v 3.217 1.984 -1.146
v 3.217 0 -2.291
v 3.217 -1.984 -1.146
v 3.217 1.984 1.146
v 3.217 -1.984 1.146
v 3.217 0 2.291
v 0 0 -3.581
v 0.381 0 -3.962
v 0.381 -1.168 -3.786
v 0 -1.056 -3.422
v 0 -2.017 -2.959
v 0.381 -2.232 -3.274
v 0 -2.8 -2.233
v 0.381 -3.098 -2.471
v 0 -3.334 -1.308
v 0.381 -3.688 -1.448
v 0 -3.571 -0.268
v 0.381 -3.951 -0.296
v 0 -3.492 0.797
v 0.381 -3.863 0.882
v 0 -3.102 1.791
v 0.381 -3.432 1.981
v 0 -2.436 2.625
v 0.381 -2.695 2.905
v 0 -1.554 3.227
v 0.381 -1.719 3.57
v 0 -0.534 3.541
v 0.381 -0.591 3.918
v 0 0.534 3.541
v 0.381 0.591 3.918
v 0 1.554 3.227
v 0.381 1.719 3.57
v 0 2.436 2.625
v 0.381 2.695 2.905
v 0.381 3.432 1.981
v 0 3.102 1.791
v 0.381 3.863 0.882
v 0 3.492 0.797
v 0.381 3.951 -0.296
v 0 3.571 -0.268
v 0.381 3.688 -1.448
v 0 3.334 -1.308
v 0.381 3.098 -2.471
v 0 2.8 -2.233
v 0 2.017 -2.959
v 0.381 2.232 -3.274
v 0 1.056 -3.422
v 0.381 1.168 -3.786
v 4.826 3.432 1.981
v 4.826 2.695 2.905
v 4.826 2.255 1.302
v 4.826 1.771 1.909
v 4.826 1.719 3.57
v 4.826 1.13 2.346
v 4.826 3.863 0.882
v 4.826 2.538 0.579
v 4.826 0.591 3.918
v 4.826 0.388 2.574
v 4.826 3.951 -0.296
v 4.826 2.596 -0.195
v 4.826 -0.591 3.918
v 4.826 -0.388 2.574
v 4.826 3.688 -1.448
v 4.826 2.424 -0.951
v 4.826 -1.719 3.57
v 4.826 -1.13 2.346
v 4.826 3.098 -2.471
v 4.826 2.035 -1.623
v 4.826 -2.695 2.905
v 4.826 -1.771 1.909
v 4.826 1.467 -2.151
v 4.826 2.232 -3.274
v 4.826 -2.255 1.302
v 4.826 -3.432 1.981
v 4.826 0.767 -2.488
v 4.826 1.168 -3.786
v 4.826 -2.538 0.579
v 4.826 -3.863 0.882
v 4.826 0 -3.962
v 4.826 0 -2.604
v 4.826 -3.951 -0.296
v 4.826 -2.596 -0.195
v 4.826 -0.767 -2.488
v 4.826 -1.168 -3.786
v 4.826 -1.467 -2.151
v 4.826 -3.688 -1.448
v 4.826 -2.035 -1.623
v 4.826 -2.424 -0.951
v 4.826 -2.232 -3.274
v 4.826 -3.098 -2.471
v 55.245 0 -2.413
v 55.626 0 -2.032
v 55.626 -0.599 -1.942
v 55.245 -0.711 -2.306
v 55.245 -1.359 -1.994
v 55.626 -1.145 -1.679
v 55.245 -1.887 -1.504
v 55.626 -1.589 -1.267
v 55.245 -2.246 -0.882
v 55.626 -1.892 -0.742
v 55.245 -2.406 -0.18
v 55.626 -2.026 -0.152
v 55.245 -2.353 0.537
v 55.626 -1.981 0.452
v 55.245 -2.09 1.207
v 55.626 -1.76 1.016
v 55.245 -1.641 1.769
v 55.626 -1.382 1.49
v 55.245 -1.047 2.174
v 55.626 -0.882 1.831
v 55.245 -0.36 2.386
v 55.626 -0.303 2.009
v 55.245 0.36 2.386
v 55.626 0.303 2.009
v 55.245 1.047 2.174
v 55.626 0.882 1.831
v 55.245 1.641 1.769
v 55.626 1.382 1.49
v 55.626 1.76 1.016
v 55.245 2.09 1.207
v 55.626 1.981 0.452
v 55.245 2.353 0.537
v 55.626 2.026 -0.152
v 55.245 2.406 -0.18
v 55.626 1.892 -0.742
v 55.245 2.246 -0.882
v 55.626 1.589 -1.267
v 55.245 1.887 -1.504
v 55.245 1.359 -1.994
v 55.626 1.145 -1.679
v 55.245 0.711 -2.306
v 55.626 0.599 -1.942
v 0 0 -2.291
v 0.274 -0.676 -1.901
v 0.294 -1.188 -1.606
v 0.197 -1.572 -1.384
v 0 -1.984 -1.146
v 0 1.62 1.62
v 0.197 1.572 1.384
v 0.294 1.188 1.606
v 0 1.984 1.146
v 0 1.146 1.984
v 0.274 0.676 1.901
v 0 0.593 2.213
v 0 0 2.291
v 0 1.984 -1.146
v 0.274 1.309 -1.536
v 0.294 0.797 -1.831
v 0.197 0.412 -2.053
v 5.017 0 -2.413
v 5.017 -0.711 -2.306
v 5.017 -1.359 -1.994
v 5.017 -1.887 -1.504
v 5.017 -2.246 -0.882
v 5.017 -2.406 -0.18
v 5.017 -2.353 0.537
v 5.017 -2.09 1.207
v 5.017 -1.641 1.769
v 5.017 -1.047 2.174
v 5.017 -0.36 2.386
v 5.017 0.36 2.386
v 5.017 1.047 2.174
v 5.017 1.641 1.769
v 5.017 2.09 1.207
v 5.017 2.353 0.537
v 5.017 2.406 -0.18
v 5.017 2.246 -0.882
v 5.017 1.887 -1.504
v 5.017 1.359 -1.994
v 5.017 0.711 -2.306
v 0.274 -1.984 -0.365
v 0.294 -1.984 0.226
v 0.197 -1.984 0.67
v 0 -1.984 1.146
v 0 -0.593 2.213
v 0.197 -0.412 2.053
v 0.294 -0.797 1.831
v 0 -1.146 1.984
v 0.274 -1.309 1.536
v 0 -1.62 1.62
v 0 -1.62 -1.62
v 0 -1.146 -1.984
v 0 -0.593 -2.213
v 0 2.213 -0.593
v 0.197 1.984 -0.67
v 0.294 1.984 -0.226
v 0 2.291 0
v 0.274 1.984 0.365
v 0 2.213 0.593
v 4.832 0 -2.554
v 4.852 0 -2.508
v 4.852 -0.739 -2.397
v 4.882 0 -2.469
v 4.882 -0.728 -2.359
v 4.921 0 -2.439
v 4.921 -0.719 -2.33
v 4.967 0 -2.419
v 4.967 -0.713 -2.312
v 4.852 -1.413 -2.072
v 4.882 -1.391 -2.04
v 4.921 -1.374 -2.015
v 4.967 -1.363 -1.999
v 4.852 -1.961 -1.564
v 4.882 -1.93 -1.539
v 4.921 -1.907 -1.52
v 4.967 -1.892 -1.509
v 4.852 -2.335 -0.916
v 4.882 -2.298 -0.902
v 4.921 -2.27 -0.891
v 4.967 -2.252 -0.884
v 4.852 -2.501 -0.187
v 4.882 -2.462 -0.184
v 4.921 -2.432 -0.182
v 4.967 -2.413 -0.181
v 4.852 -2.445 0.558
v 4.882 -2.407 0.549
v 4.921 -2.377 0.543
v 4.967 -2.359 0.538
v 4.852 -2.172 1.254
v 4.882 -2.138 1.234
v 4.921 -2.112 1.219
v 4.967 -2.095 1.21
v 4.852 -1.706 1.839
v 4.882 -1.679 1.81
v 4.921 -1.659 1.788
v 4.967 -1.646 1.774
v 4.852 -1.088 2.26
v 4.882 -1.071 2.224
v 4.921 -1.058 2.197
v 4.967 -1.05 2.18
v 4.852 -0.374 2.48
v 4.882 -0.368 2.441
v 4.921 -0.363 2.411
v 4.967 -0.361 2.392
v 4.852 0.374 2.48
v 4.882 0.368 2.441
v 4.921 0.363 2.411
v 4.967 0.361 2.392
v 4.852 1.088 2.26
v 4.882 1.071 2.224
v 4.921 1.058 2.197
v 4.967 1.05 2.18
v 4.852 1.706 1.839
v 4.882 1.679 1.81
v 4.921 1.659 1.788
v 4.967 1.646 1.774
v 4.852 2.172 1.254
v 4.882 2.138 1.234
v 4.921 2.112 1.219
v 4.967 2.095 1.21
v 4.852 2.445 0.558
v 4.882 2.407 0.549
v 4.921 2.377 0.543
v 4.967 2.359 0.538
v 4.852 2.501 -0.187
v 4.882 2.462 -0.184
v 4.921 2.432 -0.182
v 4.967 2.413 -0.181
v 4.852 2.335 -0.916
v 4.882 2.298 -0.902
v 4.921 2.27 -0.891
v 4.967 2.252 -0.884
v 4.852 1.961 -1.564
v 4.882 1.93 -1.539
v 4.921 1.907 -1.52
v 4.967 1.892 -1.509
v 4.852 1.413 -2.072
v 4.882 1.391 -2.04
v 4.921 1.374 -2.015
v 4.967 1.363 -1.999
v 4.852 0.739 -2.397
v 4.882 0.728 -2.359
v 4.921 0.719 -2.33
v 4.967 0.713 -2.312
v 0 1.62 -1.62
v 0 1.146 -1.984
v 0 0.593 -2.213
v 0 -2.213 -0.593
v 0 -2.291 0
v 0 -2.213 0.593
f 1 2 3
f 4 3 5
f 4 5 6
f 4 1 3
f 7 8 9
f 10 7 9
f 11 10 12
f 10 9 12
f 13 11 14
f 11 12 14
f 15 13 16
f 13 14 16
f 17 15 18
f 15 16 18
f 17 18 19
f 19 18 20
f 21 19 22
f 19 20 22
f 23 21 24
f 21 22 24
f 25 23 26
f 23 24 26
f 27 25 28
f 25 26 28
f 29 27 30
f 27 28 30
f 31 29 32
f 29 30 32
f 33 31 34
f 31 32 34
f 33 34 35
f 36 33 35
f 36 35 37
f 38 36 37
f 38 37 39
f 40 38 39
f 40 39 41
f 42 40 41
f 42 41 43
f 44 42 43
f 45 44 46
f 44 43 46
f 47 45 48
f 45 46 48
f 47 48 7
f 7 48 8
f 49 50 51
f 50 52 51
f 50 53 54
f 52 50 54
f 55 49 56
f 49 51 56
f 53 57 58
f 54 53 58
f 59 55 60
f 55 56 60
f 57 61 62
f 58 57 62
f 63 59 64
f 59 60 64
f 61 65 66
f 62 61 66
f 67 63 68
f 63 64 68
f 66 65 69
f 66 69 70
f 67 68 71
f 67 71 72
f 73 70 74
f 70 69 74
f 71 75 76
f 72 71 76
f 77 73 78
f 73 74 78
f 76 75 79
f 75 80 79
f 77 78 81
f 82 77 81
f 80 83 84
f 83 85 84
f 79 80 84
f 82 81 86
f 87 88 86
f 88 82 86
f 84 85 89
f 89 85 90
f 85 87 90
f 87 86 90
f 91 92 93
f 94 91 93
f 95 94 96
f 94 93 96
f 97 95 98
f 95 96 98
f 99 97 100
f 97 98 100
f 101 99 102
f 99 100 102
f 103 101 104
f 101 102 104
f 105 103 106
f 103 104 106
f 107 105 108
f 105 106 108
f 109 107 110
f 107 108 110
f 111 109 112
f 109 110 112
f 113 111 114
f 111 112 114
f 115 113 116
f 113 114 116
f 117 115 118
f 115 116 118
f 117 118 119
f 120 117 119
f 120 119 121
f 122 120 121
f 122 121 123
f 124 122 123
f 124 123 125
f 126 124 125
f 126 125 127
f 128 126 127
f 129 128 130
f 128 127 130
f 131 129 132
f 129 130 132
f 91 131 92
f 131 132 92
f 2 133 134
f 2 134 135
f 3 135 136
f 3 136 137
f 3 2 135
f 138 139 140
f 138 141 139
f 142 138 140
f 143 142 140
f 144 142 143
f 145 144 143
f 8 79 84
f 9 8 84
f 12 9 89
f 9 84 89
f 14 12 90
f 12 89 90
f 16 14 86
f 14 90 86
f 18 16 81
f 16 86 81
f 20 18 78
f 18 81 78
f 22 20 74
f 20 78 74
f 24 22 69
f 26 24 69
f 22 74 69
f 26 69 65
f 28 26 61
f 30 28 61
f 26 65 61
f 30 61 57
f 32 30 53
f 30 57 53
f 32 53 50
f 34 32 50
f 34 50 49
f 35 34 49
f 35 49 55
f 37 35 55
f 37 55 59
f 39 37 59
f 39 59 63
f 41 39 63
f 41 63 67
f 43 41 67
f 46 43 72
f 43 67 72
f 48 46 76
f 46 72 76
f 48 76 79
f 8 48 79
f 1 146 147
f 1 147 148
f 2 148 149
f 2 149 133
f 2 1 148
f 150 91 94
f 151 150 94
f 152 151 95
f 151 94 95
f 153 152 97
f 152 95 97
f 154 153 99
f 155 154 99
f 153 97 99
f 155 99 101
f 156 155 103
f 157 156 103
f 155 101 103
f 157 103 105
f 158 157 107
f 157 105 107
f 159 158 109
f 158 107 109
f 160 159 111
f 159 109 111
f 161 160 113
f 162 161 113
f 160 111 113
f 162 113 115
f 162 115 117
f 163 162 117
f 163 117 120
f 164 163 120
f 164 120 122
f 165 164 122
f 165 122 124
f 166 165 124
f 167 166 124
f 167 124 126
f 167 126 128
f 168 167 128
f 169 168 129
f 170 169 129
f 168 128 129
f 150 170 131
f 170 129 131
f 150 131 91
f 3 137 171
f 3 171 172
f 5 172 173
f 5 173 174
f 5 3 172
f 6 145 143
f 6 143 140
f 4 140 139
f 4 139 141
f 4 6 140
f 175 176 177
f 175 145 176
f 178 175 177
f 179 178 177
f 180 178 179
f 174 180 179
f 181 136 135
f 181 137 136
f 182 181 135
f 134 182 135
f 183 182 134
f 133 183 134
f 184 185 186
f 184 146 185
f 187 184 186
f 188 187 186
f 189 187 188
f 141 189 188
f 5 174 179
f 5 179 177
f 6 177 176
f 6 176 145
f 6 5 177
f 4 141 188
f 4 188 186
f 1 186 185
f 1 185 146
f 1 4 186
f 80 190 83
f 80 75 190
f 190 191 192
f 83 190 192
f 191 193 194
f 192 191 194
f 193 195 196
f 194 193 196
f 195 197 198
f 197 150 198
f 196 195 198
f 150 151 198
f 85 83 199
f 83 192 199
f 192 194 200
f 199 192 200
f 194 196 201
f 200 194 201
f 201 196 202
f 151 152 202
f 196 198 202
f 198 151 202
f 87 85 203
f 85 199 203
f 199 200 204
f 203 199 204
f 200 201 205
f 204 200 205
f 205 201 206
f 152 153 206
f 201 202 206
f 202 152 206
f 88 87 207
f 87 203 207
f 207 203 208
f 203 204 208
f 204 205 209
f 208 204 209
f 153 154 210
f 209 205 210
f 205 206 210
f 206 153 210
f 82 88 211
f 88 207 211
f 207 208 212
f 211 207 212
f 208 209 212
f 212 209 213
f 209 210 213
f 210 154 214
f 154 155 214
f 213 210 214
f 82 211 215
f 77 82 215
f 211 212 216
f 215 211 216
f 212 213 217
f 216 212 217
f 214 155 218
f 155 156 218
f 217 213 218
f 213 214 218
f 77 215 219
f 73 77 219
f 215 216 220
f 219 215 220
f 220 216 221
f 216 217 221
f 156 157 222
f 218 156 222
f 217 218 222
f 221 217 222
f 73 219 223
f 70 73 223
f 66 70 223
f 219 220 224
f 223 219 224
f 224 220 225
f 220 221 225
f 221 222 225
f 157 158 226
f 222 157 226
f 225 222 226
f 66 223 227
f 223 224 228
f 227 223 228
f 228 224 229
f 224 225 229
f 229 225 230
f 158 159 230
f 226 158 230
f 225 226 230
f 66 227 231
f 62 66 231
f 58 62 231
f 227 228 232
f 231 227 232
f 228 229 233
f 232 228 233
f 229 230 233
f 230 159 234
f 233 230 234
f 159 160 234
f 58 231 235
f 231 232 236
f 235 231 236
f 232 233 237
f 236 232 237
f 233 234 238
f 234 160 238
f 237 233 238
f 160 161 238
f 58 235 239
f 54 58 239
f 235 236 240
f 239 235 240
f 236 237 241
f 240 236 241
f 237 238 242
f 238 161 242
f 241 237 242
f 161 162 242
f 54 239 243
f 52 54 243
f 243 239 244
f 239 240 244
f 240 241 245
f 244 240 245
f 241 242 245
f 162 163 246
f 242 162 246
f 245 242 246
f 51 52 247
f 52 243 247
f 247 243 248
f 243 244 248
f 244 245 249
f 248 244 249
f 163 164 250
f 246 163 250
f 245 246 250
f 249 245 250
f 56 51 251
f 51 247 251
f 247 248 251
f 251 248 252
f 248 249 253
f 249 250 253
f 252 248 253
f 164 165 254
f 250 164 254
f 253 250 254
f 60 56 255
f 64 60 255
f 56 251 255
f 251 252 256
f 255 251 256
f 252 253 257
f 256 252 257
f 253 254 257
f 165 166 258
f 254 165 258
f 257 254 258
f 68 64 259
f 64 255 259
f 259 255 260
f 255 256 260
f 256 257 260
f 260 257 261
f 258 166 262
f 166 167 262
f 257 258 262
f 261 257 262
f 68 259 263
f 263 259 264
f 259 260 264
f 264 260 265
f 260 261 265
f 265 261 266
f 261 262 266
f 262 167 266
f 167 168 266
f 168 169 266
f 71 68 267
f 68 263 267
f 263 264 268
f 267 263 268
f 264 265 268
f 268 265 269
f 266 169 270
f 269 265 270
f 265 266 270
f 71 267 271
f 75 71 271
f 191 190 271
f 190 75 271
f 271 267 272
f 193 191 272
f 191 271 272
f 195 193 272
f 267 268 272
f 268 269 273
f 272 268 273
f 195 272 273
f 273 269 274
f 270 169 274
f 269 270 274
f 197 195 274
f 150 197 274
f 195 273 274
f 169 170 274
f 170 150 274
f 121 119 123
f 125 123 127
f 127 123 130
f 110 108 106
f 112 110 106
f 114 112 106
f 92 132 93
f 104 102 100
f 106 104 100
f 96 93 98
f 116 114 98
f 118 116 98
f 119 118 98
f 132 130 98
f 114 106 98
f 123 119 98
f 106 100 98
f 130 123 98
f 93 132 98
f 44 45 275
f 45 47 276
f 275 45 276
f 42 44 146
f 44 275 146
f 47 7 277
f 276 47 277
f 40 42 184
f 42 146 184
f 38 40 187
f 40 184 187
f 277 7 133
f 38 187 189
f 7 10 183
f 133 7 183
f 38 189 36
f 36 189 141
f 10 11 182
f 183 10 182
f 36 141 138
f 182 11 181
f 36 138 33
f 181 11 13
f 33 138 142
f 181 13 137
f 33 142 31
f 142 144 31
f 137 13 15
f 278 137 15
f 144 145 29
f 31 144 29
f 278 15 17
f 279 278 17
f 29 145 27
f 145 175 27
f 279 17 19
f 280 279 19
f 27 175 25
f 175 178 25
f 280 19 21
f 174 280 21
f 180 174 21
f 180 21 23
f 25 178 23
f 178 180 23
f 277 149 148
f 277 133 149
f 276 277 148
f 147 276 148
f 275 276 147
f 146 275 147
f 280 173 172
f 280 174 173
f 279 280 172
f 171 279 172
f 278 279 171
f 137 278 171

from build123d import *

# Parameters (mm, degrees)
HEX_START         = -3.217333
HEX_2_DEPTH       = 3.217333
CHAMFER1_SIZE     = 0.381
FILLET1_R         = 0.1905
SKETCH3_R         = 2.291358881
HEX_CHAMFER_DEPTH = 2.54
HEX_CHAMFER_DRAFT = 45


with BuildPart() as part:
    # Sketch1 → Body (revolve)
    with BuildSketch(Plane(origin=(0, 0, 0), x_dir=(1, 0, 0), z_dir=(0, 1, 0))):
        Polygon((0, 0), (0, 3.9624), (4.826, 3.9624), (4.826, 2.413), (55.626, 2.413), (55.626, 0), align=None)
    revolve(axis=Axis((55.626, 0, 0), (-1, 0, 0)))

    # Sketch2 → Hex 2 (cut)
    with BuildSketch(Plane.ZY.offset(HEX_START)):
        Polygon((-2.291358881, 0), (-1.14567944, -1.984375), (1.14567944, -1.984375), (2.291358881, 0), (1.14567944, 1.984375), (-1.14567944, 1.984375), align=None)
    extrude(amount=HEX_2_DEPTH, mode=Mode.SUBTRACT)

    # Chamfer1
    chamfer1_edges = [part.edges().sort_by_distance(p)[0] for p in [
        (0, 0, 3.9624),
        (55.626, 0, 2.413),
    ]]
    chamfer(chamfer1_edges, length=CHAMFER1_SIZE)

    # Fillet1
    fillet1_edges = [part.edges().sort_by_distance(p)[0] for p in [
        (4.826, 0, 2.413),
    ]]
    fillet(fillet1_edges, radius=FILLET1_R)


with BuildPart() as hex_chamfer_tool:
    # Sketch3 → Hex Chamfer (with draft: the straight prism first)
    with BuildSketch(Plane(origin=(0, 0, 0), x_dir=(0, 0, -1), z_dir=(1, 0, 0))):
        Circle(SKETCH3_R)
    extrude(amount=HEX_CHAMFER_DEPTH)
    # Hex Chamfer: the draft: its side faces are tilted about the plane it starts from
    hex_chamfer_sides = [hex_chamfer_tool.faces().sort_by_distance(p)[0] for p in [
        (1.27, 0, 2.291358881),
    ]]
    draft(hex_chamfer_sides, Plane(origin=(0, 0, 0), x_dir=(0, 0, -1), z_dir=(1, 0, 0)), HEX_CHAMFER_DRAFT)


with BuildPart() as part_1:
    add(part.part)

    # Hex Chamfer: cut by hex_chamfer_tool
    add(hex_chamfer_tool.part, mode=Mode.SUBTRACT)


solid = part_1.part
